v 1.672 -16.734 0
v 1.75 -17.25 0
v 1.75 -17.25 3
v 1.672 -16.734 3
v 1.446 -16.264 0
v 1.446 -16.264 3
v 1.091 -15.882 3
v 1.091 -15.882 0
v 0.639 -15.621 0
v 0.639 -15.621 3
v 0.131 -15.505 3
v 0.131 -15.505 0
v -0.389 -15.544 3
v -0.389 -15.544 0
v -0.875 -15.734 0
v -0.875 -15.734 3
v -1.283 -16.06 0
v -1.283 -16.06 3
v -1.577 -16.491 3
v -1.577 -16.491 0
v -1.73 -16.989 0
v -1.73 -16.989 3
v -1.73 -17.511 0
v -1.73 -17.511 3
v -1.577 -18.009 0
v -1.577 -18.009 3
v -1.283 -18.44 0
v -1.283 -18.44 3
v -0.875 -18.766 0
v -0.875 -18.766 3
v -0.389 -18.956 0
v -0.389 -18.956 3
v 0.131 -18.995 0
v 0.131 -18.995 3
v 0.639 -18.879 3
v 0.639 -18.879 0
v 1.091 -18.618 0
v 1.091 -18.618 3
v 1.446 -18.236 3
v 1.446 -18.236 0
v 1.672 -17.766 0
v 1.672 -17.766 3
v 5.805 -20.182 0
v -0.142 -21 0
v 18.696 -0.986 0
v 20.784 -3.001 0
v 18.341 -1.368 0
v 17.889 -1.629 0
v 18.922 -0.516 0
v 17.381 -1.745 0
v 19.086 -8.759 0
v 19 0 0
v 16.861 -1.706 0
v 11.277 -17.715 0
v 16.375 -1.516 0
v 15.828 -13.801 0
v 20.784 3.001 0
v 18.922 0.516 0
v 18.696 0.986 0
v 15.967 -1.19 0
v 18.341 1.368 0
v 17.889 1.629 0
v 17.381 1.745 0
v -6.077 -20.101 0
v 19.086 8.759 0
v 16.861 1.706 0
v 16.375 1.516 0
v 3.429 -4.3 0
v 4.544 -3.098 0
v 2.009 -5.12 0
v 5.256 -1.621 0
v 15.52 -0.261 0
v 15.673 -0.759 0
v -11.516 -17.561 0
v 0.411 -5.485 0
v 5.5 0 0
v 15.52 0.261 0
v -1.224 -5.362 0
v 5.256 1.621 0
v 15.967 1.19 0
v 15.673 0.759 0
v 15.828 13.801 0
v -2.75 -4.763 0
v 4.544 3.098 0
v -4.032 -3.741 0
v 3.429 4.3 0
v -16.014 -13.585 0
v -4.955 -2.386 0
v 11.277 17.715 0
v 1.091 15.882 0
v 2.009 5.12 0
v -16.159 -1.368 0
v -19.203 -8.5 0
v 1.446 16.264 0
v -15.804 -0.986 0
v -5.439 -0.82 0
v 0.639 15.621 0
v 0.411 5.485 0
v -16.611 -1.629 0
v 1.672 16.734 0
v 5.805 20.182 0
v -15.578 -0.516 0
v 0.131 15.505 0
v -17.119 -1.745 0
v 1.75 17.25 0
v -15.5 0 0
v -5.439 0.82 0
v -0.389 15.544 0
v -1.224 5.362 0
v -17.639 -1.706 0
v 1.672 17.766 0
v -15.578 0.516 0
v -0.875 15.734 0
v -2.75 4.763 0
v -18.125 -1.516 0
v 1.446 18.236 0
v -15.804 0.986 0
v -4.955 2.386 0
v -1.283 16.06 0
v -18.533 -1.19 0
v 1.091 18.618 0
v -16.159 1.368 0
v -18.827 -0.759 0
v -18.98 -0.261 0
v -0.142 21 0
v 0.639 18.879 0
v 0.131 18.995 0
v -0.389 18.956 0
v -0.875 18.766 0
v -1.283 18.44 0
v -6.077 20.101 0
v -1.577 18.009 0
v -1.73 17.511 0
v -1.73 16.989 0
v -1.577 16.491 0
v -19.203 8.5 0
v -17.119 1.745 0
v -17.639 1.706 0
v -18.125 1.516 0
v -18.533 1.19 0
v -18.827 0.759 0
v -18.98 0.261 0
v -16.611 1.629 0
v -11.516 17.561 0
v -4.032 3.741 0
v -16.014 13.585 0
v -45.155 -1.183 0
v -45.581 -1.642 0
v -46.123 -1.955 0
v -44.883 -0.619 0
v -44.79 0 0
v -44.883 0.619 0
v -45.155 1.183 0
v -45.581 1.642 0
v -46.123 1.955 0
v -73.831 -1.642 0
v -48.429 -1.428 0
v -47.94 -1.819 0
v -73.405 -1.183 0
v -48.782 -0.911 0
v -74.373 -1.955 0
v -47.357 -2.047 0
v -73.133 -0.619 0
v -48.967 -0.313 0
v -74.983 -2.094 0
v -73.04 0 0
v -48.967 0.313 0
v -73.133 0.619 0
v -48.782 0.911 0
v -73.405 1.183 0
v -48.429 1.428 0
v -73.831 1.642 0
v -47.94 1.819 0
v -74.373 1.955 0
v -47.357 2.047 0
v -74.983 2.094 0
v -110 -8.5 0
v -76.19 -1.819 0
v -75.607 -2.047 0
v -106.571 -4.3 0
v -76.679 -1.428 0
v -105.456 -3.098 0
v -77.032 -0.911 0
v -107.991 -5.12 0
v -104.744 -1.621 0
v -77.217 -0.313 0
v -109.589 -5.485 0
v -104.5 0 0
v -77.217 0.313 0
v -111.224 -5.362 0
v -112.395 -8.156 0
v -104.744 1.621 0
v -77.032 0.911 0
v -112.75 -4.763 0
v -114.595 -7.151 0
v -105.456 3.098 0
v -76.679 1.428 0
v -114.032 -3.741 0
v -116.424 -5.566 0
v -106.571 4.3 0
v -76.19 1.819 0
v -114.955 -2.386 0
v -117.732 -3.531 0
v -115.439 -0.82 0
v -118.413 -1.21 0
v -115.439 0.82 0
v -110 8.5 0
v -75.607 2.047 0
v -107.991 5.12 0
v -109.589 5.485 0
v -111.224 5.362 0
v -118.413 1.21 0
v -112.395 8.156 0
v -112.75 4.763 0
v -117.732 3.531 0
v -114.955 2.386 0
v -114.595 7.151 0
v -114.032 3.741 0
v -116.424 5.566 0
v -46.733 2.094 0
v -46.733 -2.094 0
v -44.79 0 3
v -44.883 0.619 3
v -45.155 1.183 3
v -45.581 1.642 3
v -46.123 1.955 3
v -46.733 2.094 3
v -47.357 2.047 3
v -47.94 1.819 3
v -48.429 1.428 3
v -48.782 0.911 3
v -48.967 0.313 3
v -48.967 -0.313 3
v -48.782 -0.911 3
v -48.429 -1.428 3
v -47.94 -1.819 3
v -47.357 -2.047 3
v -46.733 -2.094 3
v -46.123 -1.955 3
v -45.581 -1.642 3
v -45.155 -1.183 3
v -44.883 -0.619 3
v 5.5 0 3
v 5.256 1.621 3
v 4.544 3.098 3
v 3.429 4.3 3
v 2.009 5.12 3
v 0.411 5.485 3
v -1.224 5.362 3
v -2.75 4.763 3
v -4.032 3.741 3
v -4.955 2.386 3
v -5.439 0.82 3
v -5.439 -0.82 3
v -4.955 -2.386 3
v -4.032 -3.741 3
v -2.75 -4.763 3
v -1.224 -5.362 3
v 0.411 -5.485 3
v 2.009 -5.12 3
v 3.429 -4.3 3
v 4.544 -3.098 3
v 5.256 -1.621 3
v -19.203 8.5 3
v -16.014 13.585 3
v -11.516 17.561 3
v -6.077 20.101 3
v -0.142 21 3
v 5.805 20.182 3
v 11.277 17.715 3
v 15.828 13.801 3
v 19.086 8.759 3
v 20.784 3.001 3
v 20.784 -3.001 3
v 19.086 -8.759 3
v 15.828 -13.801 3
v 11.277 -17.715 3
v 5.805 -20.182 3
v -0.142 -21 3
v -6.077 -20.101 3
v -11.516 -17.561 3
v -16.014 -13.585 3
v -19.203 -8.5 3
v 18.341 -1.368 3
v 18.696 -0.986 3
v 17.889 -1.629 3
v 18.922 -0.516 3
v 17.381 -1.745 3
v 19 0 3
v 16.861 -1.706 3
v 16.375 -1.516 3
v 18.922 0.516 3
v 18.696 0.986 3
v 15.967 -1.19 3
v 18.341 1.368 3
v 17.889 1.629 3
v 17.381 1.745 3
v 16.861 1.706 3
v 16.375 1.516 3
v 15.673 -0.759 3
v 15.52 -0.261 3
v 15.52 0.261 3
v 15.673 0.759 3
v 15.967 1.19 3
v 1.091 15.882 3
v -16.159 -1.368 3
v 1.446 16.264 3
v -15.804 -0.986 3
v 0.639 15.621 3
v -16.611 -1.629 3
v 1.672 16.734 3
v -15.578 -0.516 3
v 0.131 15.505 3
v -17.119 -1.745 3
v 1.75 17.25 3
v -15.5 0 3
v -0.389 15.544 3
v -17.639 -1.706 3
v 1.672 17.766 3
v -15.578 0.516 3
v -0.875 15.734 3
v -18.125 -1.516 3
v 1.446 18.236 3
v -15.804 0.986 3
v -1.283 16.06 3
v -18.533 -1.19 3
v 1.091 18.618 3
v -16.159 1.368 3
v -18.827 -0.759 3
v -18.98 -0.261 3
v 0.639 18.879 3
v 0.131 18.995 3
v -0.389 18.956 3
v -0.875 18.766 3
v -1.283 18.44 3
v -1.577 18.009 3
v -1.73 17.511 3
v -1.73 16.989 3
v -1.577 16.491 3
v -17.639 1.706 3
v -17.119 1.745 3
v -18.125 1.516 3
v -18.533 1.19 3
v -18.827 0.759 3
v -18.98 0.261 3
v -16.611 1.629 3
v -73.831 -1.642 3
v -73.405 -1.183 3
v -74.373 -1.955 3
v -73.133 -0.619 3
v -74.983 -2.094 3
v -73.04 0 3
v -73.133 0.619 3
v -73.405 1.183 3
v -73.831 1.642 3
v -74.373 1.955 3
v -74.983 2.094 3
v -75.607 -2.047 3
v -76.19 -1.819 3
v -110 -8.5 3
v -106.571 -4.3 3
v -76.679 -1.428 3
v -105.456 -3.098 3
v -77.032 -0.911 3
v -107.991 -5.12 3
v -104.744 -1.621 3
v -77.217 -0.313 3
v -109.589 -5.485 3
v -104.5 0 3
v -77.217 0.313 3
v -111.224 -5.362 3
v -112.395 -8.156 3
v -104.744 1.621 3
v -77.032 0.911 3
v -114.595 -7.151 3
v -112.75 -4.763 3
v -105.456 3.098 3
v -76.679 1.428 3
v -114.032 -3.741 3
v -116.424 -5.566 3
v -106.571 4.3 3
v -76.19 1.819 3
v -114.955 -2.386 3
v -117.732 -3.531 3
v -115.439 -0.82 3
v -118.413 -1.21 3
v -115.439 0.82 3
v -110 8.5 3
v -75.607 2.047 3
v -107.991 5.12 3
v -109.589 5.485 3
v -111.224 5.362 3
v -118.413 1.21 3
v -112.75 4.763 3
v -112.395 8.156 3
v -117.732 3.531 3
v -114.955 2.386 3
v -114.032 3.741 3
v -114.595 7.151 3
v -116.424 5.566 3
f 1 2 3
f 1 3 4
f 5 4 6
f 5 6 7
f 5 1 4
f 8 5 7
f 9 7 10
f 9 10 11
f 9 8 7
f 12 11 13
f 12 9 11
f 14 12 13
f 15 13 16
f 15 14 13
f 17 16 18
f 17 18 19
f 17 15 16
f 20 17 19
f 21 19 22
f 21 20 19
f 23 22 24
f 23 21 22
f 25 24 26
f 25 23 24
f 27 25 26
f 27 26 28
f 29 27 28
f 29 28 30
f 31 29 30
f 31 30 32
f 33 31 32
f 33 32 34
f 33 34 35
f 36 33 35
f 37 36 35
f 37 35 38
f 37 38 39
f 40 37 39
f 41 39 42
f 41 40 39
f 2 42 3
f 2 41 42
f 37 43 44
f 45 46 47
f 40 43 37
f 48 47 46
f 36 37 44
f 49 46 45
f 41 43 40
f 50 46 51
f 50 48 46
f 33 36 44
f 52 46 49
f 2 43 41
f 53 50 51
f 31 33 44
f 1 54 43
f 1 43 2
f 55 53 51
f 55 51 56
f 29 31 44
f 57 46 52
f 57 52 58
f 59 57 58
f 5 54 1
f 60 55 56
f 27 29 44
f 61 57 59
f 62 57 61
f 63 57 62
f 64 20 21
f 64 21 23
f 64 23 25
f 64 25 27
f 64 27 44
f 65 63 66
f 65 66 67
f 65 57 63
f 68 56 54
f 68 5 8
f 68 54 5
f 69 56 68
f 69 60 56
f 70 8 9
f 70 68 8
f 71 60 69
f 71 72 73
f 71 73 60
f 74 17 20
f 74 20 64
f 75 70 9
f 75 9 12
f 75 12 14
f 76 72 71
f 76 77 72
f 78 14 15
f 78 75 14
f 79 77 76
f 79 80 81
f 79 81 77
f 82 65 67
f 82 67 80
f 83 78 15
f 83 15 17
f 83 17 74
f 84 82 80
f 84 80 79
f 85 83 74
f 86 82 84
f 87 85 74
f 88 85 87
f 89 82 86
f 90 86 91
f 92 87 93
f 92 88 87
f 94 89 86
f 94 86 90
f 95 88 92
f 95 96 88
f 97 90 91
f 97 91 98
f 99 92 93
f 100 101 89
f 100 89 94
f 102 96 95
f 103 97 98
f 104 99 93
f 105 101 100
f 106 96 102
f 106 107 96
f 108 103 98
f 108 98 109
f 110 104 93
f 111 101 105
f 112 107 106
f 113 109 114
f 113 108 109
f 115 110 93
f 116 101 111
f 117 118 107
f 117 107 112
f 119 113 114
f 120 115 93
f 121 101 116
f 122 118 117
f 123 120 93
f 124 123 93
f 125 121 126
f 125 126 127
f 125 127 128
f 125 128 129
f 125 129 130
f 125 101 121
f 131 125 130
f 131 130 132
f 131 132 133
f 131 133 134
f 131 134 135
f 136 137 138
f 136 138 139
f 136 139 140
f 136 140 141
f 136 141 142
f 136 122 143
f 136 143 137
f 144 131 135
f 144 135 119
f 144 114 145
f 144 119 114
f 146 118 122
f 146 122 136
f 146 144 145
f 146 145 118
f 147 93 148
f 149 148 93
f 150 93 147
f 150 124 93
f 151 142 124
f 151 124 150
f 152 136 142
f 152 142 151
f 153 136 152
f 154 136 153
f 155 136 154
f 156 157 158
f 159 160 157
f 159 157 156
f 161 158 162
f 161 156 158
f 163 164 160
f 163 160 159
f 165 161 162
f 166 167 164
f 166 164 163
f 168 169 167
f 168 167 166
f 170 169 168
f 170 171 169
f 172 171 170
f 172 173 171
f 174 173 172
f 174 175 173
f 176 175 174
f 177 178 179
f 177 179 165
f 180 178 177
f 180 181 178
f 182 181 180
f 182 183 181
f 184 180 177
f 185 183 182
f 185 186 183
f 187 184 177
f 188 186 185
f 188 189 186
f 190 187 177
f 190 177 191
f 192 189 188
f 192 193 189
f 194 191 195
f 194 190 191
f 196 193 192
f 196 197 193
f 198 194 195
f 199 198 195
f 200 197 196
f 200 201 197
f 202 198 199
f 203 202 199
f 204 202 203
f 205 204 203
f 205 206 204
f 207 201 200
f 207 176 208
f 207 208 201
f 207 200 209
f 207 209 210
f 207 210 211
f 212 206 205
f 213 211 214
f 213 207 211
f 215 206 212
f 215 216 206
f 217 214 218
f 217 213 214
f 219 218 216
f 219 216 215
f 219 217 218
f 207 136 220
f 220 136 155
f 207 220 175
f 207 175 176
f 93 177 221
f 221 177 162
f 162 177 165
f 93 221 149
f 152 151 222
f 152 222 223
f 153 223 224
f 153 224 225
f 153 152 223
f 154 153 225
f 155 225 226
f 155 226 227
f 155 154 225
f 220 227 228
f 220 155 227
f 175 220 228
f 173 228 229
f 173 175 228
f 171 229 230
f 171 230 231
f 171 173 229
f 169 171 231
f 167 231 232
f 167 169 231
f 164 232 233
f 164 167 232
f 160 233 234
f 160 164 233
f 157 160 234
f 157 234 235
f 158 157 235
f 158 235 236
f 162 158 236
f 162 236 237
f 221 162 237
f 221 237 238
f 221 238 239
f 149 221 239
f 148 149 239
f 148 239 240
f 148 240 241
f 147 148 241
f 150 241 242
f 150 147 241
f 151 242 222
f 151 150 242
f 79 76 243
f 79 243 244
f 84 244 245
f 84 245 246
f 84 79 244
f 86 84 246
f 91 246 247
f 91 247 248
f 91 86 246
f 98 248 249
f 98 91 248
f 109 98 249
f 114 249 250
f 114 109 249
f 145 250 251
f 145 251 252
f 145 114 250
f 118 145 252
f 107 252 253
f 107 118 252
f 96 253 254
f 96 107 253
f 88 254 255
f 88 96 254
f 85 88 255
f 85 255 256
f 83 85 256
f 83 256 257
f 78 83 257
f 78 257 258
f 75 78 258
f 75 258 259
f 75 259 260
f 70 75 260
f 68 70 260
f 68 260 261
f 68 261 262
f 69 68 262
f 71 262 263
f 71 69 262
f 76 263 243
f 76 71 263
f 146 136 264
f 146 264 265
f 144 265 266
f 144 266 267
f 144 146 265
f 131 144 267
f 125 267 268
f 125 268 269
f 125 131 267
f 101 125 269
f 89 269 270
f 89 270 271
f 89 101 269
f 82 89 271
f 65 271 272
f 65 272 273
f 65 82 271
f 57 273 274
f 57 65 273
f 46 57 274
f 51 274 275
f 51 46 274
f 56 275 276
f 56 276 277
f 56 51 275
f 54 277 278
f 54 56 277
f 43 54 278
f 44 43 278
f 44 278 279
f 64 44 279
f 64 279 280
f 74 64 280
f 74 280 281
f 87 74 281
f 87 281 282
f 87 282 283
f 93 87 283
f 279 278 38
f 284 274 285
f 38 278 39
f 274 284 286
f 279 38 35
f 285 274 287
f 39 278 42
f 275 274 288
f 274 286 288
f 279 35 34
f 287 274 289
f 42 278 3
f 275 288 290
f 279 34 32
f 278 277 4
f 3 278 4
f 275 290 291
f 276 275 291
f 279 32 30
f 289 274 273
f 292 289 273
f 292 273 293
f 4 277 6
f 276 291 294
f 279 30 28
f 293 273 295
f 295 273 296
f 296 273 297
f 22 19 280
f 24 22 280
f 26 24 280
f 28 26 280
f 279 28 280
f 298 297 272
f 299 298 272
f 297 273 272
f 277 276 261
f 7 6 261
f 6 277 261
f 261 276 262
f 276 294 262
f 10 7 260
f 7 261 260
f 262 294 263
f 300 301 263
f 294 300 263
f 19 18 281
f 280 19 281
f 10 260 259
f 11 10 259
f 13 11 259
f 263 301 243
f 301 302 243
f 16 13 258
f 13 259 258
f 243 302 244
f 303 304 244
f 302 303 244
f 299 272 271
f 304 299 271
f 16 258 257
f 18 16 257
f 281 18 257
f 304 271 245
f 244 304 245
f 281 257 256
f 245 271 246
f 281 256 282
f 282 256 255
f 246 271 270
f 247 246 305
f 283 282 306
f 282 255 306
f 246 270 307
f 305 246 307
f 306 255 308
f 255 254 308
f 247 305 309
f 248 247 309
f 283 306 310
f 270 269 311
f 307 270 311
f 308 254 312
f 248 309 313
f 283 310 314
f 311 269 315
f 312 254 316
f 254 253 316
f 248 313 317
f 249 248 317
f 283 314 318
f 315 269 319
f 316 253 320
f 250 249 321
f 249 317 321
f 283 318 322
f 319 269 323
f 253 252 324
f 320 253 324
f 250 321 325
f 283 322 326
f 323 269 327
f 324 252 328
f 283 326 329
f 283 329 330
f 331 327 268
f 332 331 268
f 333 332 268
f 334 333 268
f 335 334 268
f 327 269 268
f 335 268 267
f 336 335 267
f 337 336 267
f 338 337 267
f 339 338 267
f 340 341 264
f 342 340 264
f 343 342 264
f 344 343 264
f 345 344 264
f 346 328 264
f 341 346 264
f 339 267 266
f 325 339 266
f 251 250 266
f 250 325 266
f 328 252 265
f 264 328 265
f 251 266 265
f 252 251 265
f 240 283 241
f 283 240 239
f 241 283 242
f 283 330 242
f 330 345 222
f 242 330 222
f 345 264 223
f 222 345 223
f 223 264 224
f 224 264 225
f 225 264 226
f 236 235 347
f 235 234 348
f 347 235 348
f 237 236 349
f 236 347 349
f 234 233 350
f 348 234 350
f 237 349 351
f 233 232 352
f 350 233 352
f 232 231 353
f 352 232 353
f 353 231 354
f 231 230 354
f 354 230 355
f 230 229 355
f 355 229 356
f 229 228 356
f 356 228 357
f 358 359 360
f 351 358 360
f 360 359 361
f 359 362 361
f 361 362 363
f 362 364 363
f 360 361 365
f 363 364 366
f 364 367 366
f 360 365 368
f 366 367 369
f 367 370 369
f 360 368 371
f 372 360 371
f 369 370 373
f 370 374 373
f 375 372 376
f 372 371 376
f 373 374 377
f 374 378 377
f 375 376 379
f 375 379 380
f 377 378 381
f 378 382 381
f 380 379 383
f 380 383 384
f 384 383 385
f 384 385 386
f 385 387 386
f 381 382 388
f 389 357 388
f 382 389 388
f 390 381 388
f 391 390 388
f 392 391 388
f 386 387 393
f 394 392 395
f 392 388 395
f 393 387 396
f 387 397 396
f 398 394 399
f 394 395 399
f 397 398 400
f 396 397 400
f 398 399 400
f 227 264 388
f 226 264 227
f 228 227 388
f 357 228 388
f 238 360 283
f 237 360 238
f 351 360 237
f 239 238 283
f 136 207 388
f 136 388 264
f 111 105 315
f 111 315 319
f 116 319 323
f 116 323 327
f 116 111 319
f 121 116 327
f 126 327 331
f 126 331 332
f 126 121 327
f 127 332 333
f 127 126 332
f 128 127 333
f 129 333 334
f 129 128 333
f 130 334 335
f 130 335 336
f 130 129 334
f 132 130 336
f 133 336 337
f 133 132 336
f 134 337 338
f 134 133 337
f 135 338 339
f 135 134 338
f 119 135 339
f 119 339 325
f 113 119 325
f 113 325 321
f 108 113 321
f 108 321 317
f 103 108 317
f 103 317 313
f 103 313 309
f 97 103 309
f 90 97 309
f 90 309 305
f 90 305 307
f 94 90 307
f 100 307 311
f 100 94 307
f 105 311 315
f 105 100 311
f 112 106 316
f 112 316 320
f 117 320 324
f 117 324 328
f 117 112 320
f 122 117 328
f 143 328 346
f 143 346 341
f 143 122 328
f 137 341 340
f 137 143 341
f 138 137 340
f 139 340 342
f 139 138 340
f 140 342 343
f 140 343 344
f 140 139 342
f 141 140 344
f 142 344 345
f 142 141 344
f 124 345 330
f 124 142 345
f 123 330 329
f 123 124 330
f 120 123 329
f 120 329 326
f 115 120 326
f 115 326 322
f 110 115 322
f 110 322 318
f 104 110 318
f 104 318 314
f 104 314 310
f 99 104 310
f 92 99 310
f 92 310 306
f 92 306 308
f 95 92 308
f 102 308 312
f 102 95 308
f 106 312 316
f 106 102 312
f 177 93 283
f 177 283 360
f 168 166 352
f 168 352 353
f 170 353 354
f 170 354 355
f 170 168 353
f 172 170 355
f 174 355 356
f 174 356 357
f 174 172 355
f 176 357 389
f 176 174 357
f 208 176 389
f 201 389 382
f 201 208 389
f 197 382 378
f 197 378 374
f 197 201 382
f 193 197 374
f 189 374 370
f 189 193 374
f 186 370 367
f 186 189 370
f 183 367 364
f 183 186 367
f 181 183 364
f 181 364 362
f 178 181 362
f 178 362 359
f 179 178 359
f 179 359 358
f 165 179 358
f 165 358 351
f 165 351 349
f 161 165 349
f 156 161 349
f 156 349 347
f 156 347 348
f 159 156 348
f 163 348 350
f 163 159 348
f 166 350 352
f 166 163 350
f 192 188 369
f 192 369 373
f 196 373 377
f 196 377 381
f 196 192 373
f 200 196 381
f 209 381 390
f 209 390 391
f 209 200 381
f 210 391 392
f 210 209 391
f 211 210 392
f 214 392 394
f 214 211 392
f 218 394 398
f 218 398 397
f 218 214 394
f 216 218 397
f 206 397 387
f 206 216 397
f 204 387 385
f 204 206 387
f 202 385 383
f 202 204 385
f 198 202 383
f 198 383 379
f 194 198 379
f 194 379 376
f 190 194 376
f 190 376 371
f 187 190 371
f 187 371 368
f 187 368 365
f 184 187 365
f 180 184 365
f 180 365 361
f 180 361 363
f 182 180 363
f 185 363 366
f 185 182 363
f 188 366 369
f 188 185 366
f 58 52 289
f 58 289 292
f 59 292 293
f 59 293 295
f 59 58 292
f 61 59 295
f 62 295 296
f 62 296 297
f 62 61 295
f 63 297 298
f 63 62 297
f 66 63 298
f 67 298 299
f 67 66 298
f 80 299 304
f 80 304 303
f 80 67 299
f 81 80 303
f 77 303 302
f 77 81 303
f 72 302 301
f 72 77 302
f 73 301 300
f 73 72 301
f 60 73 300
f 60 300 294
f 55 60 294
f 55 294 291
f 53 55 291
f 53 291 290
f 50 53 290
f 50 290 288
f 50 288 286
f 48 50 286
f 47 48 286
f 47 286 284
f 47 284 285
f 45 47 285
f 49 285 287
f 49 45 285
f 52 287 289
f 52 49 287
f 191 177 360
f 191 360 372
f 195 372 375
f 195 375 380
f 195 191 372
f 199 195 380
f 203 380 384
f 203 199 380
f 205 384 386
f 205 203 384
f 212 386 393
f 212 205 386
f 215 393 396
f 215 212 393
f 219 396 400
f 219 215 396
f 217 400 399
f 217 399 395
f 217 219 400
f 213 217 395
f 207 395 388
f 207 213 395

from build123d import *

# Parameters (mm, degrees)
ESQUISSE1_R        = 5.5
ESQUISSE1_R_2      = 1.75
ESQUISSE1_R_3      = 2.1
BOSS_EXTRU_1_DEPTH = 3


with BuildPart() as part:
    # Esquisse1 → Boss.-Extru.1 (new body)
    with BuildSketch(Plane.XY):
        with BuildLine():
            Line((-110, 8.5), (-19.20286437, 8.5))
            ThreePointArc((-19.20286437, 8.5), (21, 0), (-19.20286437, -8.5))
            Line((-19.20286437, -8.5), (-110, -8.5))
            ThreePointArc((-110, -8.5), (-118.5, 0), (-110, 8.5))
        make_face()
        with Locations((-110, 0)):
            Circle(ESQUISSE1_R, mode=Mode.SUBTRACT)
        Circle(ESQUISSE1_R, mode=Mode.SUBTRACT)
        with Locations((0, 17.25)):
            Circle(ESQUISSE1_R_2, mode=Mode.SUBTRACT)
        with Locations((17.25, 0)):
            Circle(ESQUISSE1_R_2, mode=Mode.SUBTRACT)
        with Locations((0, -17.25)):
            Circle(ESQUISSE1_R_2, mode=Mode.SUBTRACT)
        with Locations((-17.25, 0)):
            Circle(ESQUISSE1_R_2, mode=Mode.SUBTRACT)
        with Locations((-75.14, 0)):
            Circle(ESQUISSE1_R_3, mode=Mode.SUBTRACT)
        with Locations((-46.89, 0)):
            Circle(ESQUISSE1_R_3, mode=Mode.SUBTRACT)
    extrude(amount=BOSS_EXTRU_1_DEPTH)


solid = part.part
